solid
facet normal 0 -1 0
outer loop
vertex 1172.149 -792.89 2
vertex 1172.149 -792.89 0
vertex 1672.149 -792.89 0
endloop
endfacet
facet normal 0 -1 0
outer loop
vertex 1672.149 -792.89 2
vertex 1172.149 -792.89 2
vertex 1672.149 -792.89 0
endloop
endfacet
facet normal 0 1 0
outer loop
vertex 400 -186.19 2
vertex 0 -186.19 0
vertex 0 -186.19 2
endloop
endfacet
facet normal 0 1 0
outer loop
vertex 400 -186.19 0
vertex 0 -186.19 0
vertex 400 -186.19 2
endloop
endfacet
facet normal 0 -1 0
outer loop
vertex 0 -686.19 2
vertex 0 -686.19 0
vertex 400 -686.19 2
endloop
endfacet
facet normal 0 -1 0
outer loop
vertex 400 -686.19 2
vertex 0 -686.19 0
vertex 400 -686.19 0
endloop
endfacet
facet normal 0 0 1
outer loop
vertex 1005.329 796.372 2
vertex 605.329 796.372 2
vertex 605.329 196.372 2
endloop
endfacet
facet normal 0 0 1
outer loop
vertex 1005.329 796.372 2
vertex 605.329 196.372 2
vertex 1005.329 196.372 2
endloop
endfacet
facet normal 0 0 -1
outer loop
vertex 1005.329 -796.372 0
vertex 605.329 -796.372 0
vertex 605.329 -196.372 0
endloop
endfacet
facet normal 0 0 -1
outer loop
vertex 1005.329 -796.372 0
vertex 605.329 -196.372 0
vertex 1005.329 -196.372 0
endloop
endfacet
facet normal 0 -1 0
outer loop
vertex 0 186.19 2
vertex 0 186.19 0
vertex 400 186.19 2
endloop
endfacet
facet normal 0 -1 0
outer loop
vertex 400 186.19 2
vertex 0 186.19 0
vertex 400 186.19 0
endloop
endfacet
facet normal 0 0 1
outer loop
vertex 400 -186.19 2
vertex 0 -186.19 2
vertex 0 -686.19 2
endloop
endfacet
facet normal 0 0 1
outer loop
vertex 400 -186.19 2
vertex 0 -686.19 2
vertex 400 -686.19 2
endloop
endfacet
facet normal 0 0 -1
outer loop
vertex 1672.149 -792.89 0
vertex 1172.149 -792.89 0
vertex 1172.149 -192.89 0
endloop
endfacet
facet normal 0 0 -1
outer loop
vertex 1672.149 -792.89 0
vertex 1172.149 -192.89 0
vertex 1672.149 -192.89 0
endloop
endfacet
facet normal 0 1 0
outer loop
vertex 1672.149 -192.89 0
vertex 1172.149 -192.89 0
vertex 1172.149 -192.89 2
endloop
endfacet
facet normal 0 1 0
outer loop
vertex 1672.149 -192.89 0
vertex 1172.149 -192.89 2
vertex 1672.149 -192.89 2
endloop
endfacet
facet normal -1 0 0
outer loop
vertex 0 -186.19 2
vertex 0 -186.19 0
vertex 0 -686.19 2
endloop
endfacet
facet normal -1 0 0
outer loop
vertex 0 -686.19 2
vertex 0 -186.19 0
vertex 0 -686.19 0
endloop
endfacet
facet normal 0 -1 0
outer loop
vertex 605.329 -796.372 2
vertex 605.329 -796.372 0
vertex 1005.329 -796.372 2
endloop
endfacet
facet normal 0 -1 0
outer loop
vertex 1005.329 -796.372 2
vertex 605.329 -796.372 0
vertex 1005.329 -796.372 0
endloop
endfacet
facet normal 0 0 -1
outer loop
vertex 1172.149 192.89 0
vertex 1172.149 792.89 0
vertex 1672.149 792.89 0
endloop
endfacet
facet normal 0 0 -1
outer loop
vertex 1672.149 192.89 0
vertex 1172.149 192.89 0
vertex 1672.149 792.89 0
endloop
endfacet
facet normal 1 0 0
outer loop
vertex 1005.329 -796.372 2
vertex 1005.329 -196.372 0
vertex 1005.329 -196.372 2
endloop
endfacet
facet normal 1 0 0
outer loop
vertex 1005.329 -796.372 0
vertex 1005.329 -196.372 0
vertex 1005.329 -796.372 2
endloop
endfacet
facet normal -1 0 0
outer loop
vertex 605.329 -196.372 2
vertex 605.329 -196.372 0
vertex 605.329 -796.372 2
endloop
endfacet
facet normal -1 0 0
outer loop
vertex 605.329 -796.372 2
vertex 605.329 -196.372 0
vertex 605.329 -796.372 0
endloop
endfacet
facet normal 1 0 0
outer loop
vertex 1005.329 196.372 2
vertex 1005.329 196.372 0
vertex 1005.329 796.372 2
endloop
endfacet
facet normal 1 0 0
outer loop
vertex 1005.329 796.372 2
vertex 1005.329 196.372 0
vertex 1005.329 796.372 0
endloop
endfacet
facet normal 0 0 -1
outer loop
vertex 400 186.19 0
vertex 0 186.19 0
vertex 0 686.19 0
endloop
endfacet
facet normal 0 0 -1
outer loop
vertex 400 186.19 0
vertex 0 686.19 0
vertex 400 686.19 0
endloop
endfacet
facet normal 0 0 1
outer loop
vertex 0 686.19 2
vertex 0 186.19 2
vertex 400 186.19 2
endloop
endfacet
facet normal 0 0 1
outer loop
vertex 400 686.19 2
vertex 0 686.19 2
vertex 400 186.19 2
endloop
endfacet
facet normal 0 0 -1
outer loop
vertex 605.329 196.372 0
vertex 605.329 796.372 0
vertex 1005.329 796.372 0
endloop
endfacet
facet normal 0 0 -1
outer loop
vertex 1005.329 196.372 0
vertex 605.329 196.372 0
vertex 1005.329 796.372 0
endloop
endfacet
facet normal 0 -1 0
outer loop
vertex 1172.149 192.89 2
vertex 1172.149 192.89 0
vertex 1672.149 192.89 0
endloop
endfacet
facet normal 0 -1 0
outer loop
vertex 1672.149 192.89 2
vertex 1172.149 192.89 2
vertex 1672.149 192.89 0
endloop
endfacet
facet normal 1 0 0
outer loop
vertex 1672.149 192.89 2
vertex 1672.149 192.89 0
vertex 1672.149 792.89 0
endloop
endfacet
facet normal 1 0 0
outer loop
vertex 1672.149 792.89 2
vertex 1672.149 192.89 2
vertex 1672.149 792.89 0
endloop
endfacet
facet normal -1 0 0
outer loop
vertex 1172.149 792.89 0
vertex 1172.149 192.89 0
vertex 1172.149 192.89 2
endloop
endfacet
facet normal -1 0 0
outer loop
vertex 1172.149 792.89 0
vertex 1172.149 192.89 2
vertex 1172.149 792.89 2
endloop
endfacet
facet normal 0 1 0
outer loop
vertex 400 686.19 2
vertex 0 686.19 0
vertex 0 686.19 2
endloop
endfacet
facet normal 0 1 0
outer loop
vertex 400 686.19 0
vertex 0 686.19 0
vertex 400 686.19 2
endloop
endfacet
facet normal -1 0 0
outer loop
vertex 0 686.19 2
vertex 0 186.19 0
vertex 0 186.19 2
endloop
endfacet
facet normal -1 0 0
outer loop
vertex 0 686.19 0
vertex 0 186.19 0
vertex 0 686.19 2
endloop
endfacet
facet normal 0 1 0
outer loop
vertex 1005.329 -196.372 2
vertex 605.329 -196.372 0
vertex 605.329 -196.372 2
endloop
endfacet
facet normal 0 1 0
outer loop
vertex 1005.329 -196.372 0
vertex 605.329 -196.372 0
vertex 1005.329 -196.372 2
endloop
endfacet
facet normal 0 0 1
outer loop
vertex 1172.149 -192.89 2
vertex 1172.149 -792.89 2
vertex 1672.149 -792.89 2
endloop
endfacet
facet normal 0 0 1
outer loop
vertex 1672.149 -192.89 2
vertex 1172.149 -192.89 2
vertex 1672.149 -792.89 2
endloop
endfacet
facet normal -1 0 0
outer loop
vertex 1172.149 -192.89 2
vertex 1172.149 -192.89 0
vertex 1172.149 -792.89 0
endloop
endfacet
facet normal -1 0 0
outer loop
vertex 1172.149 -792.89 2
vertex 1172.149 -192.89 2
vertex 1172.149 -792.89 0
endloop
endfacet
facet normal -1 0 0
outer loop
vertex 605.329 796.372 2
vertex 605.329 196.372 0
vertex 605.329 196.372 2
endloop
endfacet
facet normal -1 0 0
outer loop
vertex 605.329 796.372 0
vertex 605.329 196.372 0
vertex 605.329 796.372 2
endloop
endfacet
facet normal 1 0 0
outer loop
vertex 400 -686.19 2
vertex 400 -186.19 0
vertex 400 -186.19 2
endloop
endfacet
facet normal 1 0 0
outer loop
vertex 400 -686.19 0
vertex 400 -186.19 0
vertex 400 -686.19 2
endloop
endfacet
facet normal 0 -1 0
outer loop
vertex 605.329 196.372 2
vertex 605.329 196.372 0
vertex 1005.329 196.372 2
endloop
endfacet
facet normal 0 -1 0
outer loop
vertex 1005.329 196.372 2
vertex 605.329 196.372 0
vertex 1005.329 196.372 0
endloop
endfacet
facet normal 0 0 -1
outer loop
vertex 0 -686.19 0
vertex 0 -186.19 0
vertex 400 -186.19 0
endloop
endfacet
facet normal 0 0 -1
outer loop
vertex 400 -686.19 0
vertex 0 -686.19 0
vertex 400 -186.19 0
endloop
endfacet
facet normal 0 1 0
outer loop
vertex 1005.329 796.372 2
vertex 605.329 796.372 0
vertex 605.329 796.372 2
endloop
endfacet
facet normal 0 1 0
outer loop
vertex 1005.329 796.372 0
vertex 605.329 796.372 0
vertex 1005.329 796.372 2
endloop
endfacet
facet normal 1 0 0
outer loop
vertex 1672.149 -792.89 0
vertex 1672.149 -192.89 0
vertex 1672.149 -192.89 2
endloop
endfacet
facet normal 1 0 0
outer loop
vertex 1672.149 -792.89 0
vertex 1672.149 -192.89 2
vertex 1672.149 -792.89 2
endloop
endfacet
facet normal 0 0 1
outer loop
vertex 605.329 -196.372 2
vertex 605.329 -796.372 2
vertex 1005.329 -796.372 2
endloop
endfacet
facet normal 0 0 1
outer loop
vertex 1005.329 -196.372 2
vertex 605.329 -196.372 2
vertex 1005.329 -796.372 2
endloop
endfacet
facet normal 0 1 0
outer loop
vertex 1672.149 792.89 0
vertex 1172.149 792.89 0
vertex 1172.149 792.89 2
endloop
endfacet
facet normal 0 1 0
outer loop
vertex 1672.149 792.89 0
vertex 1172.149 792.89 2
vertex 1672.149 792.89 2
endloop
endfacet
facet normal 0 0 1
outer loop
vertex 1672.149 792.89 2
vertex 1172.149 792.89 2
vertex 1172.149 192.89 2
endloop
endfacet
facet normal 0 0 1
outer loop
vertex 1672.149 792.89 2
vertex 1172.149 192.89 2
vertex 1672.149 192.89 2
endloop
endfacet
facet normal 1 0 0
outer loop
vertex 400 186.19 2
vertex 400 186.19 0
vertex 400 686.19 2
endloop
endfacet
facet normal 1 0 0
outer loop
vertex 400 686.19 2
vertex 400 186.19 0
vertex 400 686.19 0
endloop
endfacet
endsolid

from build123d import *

# Parameters (mm, degrees)
F0_W     = 400
F0_H     = 500
F0_H_2   = 600
F0_W_2   = 500
F1_DEPTH = 2


with BuildPart() as f1:
    # F0 (on Top) → F1 (new body)
    with BuildSketch(Plane.XY):
        with Locations((200, 436.189956)):
            Rectangle(F0_W, F0_H)
        with Locations((805.329216, 496.371694)):
            Rectangle(F0_W, F0_H_2)
        with Locations((1422.148585, 492.8895)):
            Rectangle(F0_W_2, F0_H_2)
    extrude(amount=F1_DEPTH)


with BuildPart() as f2_1:
    # F2: instance of F1
    add(f1.part.mirror(Plane.XZ))


solid = Compound([f1.part, f2_1.part])
